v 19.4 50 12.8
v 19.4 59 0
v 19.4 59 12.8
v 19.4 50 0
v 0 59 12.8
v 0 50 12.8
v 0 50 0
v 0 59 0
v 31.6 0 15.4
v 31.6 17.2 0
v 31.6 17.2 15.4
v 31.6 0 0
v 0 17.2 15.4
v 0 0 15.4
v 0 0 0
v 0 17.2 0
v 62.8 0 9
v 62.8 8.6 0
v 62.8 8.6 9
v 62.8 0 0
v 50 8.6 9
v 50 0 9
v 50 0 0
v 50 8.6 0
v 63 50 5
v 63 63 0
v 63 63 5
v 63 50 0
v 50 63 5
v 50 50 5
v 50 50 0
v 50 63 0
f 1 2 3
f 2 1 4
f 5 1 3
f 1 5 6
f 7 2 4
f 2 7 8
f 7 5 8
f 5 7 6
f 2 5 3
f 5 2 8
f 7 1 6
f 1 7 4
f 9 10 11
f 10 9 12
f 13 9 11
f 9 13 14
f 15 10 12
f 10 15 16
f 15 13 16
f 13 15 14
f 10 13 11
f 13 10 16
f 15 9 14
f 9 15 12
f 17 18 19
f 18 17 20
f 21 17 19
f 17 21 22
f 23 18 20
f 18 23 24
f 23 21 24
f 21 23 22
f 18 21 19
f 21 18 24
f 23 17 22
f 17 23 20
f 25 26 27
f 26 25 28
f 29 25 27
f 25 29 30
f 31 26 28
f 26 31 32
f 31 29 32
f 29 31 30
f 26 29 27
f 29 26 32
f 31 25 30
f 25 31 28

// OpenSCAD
union(){
    translate(v=[0, 50, 0]){
        color("Blue"){
            cube(size=[19.4, 9, 12.8]);
        };
    };
    translate(v=[0, 0, 0]){
        color("Red"){
            cube(size=[31.6, 17.2, 15.4]);
        };
    };
    translate(v=[50, 0, 0]){
        color("Green"){
            cube(size=[12.8, 8.6, 9]);
        };
    };
    translate(v=[50, 50, 0]){
        color("Yellow"){
            cube(size=[13, 13, 5]);
        };
    };
};
